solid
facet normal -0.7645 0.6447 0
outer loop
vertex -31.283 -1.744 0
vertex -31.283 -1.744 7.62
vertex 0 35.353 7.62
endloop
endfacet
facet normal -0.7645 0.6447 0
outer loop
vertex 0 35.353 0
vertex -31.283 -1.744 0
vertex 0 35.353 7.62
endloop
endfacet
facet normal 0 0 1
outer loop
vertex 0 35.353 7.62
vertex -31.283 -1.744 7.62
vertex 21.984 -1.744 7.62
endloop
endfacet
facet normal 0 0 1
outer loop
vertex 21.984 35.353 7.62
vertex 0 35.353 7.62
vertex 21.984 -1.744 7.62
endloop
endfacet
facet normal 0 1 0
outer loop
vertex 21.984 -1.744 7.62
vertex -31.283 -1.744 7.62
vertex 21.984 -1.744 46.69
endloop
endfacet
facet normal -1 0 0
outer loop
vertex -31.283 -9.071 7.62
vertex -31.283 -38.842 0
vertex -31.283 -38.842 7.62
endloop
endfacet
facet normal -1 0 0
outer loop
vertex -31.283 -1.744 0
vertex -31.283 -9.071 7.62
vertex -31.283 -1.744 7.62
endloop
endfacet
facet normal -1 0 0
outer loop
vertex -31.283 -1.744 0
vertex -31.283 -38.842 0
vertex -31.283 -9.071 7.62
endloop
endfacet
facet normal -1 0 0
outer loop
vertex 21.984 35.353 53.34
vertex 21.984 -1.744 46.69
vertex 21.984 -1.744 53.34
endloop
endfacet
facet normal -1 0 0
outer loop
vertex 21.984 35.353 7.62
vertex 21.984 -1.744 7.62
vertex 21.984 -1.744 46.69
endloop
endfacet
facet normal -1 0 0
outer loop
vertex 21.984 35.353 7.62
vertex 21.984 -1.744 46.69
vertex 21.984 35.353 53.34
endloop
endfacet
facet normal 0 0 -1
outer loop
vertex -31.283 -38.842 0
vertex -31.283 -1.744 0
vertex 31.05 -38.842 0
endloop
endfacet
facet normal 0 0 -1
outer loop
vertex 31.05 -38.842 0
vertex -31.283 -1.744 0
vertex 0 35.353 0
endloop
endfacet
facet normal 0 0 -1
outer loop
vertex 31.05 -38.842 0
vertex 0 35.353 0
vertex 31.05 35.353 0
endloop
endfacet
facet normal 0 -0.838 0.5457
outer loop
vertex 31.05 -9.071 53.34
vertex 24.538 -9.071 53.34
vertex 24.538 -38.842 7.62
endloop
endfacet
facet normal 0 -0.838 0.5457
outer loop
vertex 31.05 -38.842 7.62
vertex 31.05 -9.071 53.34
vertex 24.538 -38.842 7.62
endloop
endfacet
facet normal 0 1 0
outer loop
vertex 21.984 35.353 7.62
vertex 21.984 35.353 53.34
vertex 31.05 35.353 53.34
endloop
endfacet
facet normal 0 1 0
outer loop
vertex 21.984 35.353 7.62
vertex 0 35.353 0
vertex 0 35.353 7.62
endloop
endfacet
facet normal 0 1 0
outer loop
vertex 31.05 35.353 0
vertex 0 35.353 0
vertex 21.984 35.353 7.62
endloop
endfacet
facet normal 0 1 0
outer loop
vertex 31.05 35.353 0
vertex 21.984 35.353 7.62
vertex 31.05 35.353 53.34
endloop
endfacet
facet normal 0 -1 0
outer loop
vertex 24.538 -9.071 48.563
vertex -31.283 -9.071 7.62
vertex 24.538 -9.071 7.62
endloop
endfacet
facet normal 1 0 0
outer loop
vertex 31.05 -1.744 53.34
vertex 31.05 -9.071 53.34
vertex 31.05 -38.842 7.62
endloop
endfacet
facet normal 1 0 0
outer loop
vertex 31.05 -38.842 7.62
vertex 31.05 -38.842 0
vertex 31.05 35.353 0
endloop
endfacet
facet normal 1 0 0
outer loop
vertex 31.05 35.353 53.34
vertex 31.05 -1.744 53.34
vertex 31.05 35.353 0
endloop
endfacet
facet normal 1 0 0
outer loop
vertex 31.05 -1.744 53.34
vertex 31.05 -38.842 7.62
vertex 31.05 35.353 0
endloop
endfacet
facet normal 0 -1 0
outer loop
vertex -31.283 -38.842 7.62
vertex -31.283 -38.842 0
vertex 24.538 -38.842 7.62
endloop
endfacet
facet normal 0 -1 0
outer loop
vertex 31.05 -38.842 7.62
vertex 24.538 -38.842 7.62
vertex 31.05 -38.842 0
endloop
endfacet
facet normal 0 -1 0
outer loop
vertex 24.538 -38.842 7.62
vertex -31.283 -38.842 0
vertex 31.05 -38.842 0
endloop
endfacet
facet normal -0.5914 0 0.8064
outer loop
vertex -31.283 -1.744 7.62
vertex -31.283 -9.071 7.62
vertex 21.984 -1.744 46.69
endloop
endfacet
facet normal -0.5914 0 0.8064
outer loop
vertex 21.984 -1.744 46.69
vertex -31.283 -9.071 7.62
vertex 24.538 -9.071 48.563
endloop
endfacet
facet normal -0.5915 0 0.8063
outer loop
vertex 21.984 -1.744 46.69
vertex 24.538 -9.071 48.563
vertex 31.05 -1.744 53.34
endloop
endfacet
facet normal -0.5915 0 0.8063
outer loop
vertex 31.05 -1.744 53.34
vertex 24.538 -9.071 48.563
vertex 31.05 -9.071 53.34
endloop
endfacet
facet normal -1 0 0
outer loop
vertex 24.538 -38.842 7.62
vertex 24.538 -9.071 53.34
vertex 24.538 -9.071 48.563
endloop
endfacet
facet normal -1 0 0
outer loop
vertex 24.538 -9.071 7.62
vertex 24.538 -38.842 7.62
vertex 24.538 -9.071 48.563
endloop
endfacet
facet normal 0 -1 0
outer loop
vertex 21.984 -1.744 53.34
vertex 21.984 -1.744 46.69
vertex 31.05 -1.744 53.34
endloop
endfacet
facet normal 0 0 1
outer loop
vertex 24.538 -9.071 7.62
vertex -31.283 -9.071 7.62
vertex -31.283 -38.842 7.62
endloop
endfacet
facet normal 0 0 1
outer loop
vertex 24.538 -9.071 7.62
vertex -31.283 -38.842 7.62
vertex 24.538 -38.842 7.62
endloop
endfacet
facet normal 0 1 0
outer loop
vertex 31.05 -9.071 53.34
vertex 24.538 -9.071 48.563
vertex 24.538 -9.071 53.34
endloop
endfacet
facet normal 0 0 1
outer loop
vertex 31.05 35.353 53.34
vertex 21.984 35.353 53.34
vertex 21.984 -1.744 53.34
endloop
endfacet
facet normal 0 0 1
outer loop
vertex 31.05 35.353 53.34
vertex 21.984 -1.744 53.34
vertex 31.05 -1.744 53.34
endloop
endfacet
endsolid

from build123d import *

# Parameters (mm, degrees)
F0_W      = 62.3333714902
F0_H      = 74.1953216493
F1_DEPTH  = 7.62
F3_DEPTH  = 25.4
F4_DEPTH  = 33.02
F5_W      = 62.3333714902
F5_H      = 7.3264986277
F6_DEPTH  = 45.72
F8_DEPTH  = 25.4
F9_W      = 6.5124388784
F9_H      = 29.771162197
F10_DEPTH = 45.72
F12_DEPTH = 25.4
F13_W     = 9.0668685734
F13_H     = 37.0976608247
F14_DEPTH = 45.72


with BuildPart() as f1:
    # F0 (on Top) → F1 (new body)
    with BuildSketch(Plane.XY):
        with Locations((-0.1162942499, -1.7444025725)):
            Rectangle(F0_W, F0_H)
    extrude(amount=F1_DEPTH)

    # F2 (on face) → F3 (join)
    with BuildSketch(Plane.XY.offset(7.62)):
        Polygon((-31.282979995, 35.3532582521), (-31.282979995, -1.7444025725), (0, 35.3532582521), align=None)
    extrude(amount=F3_DEPTH)

    # F4 (cut): a face of the model
    f4_faces = [f1.faces().sort_by_distance(p)[0] for p in [
        (-20.8553199967, 22.9873713106, 33.02),
    ]]
    extrude(f4_faces, amount=-F4_DEPTH, mode=Mode.SUBTRACT)

    # F5 (on face) → F6 (join)
    with BuildSketch(Plane.XY.offset(7.62)):
        with Locations((-0.1162942499, -5.4076518863)):
            Rectangle(F5_W, F5_H)
    extrude(amount=F6_DEPTH)

    # F7 (on face) → F8 (cut)
    with BuildSketch(Plane.XZ.offset(9.0709012002)):
        Polygon((-31.282979995, 53.34), (-31.282979995, 7.62), (31.0503914952, 53.34), align=None)
    extrude(amount=-F8_DEPTH, mode=Mode.SUBTRACT)

    # F9 (on face) → F10 (join)
    with BuildSketch(Plane.XY.offset(7.62)):
        with Locations((27.794172056, -23.9564822987)):
            Rectangle(F9_W, F9_H)
    extrude(amount=F10_DEPTH)

    # F11 (on face) → F12 (cut)
    with BuildSketch(Plane(origin=(24.5379526168, 0, 0), x_dir=(0, -1, 0), z_dir=(-1, 0, 0))):
        Polygon((38.8420633972, 53.34), (9.0709012002, 53.34), (38.8420633972, 7.62), align=None)
    extrude(amount=-F12_DEPTH, mode=Mode.SUBTRACT)

    # F13 (on face) → F14 (join)
    with BuildSketch(Plane.XY.offset(7.62)):
        with Locations((26.5169572085, 16.8044278398)):
            Rectangle(F13_W, F13_H)
    extrude(amount=F14_DEPTH)


solid = f1.part
